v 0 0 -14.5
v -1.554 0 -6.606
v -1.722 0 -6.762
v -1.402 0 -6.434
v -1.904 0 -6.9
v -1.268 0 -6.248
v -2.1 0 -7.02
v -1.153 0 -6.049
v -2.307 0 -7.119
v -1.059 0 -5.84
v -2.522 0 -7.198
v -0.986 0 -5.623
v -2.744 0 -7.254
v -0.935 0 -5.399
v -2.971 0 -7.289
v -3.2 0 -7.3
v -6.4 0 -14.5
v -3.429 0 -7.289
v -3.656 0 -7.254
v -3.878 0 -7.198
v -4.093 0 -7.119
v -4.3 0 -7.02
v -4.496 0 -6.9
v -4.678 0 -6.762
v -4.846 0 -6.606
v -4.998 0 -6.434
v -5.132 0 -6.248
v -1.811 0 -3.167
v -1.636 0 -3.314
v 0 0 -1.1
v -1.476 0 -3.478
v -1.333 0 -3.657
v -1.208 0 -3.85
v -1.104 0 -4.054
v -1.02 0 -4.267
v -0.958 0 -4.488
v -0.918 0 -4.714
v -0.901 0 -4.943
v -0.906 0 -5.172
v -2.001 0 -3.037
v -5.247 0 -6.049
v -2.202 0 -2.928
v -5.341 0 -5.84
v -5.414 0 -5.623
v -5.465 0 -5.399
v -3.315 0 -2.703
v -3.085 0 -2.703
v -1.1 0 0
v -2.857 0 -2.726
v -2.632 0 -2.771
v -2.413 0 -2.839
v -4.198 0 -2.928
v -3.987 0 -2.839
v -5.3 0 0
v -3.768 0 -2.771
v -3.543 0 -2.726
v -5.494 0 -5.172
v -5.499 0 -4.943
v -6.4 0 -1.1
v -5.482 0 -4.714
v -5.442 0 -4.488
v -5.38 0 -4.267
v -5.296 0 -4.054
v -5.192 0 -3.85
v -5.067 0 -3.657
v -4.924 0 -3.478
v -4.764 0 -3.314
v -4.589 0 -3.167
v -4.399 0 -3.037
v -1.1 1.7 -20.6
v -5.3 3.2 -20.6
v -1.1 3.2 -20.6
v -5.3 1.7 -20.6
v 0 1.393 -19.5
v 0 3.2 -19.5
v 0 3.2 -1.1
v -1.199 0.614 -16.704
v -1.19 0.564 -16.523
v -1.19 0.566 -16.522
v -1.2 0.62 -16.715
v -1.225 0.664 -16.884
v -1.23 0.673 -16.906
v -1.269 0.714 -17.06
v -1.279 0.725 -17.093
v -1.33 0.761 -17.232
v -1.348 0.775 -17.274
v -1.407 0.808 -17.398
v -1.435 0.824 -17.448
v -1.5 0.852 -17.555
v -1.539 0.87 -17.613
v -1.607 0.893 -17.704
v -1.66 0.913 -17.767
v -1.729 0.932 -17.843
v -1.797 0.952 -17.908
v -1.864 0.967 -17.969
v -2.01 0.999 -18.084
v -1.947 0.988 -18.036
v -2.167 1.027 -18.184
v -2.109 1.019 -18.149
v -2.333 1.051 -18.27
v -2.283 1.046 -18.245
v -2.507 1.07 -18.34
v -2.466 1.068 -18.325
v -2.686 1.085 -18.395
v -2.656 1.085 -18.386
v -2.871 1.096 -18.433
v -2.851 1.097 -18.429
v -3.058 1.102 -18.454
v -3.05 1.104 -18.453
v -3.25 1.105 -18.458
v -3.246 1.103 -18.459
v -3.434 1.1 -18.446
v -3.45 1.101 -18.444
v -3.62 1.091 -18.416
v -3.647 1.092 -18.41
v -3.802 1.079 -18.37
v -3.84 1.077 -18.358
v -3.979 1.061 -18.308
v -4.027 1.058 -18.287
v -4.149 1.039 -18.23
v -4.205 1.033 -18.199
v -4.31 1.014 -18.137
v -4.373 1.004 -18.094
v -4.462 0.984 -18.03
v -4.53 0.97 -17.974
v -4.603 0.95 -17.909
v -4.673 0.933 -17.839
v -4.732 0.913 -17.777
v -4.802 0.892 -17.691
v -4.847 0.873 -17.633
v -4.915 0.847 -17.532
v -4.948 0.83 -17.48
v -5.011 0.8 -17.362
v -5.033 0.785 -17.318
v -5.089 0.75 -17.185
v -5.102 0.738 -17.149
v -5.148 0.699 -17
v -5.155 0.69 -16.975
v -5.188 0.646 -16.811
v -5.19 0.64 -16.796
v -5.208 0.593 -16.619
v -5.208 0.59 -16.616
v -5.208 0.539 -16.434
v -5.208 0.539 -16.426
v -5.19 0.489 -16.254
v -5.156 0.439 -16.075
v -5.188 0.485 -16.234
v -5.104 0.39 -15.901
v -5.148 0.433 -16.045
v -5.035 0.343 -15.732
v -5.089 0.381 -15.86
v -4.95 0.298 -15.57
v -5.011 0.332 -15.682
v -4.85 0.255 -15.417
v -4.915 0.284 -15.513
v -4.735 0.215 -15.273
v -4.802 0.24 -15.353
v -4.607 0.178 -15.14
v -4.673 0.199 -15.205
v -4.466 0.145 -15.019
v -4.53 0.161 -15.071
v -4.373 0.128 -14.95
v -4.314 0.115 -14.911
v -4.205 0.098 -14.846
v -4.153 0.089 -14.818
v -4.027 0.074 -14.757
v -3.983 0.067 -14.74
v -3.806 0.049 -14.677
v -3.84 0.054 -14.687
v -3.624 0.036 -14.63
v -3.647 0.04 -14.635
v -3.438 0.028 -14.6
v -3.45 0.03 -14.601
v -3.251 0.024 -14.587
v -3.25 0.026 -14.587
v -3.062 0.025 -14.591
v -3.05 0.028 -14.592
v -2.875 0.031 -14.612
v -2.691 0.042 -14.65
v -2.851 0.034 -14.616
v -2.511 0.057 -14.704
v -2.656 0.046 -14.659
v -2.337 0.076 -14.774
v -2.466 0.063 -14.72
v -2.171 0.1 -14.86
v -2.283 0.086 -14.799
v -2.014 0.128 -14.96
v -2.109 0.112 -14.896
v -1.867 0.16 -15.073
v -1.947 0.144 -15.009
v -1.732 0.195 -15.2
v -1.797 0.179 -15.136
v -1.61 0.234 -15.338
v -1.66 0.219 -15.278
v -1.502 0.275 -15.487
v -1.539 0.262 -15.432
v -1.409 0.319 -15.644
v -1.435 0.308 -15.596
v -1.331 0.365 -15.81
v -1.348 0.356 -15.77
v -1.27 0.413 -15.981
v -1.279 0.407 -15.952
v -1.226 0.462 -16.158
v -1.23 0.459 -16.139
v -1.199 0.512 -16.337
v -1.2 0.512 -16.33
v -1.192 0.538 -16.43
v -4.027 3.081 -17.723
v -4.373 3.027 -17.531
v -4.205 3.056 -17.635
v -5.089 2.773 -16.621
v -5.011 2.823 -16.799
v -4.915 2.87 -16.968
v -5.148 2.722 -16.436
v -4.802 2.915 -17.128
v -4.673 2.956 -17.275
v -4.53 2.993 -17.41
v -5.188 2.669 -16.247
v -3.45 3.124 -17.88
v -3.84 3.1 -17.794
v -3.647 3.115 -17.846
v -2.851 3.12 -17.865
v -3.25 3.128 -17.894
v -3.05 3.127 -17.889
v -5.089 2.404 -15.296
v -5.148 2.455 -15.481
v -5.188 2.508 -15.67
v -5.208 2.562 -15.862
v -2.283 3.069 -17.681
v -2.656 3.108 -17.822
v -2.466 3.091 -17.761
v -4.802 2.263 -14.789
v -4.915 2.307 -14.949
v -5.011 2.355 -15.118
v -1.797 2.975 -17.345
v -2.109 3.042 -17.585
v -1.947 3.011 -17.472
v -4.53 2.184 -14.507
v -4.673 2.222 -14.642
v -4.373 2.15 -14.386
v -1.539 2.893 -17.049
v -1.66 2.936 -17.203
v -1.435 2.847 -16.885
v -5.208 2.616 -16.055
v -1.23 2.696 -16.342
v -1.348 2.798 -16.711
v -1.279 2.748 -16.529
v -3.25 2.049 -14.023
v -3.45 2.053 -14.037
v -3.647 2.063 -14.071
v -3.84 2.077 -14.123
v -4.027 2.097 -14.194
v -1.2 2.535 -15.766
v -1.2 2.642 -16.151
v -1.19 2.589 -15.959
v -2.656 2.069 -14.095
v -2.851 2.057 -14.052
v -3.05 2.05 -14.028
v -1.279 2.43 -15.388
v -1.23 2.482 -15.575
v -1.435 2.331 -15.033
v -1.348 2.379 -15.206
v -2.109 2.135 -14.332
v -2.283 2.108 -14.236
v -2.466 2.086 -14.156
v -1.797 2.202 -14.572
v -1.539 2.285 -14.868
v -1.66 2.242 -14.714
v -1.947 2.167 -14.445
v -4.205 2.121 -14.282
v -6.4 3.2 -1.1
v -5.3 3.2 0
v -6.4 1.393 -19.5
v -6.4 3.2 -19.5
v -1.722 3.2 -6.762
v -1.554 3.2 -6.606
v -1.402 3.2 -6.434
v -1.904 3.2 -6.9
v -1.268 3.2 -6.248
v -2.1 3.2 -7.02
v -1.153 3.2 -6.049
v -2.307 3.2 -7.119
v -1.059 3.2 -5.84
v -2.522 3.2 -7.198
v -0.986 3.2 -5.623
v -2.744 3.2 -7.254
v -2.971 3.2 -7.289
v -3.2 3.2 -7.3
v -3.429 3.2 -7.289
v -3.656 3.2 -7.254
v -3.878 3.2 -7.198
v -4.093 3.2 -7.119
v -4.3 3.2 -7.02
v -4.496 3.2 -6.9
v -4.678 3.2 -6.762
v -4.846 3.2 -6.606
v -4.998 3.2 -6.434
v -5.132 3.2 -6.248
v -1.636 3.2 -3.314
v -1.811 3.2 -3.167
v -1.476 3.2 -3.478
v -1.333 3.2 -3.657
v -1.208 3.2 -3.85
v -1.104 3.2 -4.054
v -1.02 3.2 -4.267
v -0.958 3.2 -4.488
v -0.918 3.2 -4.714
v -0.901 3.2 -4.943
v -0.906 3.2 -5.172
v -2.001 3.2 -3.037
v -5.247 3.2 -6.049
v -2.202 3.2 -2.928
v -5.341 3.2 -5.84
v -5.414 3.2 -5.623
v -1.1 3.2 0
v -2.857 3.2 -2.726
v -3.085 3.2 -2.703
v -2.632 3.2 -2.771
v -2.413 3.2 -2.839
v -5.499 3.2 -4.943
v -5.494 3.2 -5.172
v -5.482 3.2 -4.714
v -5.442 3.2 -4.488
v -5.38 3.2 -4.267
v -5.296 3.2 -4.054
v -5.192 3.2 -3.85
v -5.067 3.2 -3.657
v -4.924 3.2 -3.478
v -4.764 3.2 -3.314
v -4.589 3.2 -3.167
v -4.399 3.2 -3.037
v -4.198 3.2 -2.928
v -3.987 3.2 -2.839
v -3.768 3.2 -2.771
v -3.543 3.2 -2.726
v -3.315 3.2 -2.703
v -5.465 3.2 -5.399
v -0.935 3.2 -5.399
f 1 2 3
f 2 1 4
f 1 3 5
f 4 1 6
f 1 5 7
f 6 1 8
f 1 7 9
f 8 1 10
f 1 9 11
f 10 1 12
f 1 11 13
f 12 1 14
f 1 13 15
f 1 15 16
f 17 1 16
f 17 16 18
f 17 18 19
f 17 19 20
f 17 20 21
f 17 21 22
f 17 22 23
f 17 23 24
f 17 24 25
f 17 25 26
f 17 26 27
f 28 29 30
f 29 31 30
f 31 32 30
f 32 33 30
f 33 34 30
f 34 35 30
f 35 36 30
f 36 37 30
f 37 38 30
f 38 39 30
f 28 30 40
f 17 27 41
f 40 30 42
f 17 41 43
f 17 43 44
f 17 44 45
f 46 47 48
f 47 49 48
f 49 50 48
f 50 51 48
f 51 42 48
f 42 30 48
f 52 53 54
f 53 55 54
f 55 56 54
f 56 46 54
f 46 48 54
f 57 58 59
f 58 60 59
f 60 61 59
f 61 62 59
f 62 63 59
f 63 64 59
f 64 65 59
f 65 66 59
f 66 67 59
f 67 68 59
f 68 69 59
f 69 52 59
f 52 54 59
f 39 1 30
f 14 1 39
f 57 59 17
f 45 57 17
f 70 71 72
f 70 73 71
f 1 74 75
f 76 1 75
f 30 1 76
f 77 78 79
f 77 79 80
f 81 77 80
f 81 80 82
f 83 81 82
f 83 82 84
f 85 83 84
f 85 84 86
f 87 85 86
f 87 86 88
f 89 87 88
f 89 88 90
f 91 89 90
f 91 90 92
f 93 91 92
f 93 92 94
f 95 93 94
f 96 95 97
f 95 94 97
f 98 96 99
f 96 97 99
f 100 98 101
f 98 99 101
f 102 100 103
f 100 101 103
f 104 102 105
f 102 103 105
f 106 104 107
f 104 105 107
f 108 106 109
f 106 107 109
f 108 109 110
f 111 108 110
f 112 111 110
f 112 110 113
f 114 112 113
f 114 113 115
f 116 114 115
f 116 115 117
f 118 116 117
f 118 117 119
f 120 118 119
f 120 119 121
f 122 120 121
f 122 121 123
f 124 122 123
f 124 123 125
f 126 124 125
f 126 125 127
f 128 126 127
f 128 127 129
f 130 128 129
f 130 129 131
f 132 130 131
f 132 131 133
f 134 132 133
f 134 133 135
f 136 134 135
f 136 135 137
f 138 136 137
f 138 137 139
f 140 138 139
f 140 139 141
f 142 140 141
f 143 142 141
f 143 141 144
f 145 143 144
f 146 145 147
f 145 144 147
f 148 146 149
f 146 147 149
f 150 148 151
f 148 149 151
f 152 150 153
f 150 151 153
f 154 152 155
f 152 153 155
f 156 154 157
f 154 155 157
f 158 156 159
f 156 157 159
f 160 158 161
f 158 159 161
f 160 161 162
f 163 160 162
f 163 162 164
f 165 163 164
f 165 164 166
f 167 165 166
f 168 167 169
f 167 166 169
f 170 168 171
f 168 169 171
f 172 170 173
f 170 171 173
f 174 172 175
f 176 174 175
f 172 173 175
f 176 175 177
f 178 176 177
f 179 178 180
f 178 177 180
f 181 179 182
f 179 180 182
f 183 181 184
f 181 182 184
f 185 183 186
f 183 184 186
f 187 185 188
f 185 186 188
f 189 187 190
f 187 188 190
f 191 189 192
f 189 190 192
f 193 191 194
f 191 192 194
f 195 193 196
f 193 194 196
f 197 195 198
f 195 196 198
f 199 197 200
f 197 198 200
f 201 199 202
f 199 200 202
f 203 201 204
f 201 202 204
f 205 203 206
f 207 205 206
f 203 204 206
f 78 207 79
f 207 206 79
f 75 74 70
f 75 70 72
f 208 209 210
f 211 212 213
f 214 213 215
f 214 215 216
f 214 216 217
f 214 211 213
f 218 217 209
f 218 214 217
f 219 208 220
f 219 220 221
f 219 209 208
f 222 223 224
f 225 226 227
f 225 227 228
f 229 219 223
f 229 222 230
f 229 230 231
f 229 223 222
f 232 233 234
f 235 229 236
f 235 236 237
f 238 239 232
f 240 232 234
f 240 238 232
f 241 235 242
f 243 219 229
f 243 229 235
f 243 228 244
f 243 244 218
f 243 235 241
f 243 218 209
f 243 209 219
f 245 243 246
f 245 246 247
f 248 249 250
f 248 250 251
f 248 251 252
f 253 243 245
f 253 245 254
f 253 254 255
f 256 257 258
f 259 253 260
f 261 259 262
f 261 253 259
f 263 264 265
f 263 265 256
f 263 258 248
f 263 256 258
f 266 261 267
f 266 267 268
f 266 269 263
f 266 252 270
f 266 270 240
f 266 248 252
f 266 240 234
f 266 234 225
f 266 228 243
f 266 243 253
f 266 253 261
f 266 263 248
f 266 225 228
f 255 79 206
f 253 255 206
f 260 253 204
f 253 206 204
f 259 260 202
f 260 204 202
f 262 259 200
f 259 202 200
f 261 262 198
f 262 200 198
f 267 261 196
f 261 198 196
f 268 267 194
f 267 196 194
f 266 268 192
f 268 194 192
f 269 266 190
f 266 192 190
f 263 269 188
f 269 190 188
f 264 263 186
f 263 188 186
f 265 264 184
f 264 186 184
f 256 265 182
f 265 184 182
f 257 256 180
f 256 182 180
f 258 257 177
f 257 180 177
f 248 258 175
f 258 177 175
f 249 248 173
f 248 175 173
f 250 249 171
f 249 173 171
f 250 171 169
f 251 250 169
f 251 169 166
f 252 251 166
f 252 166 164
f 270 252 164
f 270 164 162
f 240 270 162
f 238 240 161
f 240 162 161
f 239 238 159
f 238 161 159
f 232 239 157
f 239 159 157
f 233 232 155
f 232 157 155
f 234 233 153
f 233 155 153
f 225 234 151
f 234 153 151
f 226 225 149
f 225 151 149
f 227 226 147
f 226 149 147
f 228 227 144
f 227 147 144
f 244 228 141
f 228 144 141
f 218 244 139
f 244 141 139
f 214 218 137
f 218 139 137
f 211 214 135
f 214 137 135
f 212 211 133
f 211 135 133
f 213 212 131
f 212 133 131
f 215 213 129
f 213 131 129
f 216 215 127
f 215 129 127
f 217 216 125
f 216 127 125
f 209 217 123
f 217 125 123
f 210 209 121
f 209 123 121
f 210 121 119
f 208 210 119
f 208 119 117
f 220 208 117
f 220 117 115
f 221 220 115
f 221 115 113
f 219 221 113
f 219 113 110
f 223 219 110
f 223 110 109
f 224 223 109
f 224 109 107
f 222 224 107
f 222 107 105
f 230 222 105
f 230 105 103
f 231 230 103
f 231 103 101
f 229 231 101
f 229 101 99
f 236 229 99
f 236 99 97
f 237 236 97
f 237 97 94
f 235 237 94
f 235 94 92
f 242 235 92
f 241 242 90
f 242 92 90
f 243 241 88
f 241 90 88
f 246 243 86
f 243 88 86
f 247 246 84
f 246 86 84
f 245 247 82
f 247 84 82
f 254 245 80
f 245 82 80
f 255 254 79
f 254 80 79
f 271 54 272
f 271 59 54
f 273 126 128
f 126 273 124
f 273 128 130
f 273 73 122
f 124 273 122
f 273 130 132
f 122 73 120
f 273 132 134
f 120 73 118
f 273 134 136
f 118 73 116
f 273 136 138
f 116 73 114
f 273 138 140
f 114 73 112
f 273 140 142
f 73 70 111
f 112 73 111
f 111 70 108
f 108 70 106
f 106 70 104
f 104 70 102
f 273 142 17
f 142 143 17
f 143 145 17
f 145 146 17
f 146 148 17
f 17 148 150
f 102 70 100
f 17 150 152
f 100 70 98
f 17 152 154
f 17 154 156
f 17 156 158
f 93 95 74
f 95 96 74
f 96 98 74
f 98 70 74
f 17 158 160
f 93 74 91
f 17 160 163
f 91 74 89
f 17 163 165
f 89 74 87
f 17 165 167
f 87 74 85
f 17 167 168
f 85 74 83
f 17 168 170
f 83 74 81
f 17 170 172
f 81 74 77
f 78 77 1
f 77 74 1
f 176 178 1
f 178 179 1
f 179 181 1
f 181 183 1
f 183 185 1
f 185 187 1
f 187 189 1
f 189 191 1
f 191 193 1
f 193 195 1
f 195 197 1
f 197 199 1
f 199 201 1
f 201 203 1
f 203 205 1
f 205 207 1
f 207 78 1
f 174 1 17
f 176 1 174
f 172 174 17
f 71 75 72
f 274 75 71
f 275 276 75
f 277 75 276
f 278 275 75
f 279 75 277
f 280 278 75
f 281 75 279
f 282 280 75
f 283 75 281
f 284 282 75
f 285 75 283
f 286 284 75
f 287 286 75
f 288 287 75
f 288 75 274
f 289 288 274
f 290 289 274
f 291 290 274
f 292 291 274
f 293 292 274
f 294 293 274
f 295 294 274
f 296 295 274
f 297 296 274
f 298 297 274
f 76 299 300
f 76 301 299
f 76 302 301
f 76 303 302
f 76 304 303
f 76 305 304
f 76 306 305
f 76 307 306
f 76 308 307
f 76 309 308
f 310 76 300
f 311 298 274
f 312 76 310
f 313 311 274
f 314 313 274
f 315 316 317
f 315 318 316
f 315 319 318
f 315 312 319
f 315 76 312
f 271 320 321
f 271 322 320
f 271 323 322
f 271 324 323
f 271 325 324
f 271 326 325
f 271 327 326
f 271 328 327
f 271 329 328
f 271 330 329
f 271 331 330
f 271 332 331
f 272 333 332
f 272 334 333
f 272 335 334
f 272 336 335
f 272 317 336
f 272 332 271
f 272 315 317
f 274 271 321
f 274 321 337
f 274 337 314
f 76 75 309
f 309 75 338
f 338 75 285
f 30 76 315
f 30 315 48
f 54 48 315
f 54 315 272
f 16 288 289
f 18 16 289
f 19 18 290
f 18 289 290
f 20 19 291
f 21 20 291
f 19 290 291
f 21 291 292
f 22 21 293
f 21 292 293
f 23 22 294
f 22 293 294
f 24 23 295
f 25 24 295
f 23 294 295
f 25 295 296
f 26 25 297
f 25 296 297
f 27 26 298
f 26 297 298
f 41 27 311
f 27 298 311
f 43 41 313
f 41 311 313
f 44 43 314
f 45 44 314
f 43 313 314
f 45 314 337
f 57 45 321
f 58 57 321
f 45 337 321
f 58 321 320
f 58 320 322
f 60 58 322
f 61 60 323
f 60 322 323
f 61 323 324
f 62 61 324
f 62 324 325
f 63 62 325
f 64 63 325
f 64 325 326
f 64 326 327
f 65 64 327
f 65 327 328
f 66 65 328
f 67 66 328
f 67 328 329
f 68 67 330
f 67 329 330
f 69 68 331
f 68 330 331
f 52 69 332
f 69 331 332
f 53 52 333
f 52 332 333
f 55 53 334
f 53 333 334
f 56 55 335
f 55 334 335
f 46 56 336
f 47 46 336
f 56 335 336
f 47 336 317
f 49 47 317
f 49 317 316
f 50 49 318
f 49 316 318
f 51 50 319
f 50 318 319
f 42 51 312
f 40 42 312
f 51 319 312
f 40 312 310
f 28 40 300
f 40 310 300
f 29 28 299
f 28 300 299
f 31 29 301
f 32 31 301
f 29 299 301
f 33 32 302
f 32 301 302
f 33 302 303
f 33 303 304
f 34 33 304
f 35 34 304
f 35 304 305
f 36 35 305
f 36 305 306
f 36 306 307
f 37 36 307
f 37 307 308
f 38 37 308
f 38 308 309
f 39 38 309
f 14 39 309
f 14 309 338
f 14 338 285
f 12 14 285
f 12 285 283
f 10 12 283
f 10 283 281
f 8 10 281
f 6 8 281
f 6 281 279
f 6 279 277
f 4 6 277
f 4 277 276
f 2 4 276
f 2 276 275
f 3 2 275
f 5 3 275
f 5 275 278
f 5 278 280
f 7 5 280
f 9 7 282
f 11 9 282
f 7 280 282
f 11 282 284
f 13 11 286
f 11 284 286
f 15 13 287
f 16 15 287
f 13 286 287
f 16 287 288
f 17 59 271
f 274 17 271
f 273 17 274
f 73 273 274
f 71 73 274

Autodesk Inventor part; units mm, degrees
ref_plane "YZ Plane" through (0, 0, 0) normal (1, 0, 0) x (0, 1, 0)
ref_plane "XZ Plane" through (0, 0, 0) normal (0, 1, 0) x (-1, 0, 0)
sketch "Sketch1" plane through (0, 0, 0) normal (0, 1, 0) x (-1, 0, 0)
  line L0 (0, 0) -> (6.4, 0)
  line L1 (6.4, 0) -> (6.4, -20.6)
  line L2 (6.4, -20.6) -> (0, -20.6)
  line L3 (0, -20.6) -> (0, 0)
  point P0 (3.2, -7.9)
  dimension "d0" = 6.4
  dimension "d1" = 20.6
extrude "Extrusion1" add sketch "Sketch1" along normal blind 3.2
sketch "Sketch3" plane through (0, 0, 0) normal (0, -1, 0) x (1, 0, 0)
  point P0 (0, 0)
  point P1 (-3.2, -5)
hole "Hole1" at (-3.2, 0, -5) direction (0, 1, 0) diameter 4.6 end through all
chamfer "Chamfer1" distance 1.1 angle 45 1 edges at (0, 1.6, 0)
chamfer "Chamfer2" distance 1.1 angle 45 1 edges at (-6.4, 1.6, 0)
chamfer "Chamfer3" distance 1.1 angle 45 1 edges at (-6.4, 1.6, -20.6)
chamfer "Chamfer4" distance 1.1 angle 45 1 edges at (0, 1.6, -20.6)
sketch "Sketch5" plane through (0, 0, 0) normal (1, 0, 0) x (0, 1, 0)
  line L0 (3.2, -20.6) -> (0, -20.6) projected
  line L1 (0, -20.6) -> (0, -14.5)
  line L2 (0, -1.1) -> (0, -19.5) projected
  line L3 (0, -20.6) -> (1.7, -20.6)
  line L4 (1.7, -20.6) -> (0, -14.5)
  point P0 (0, 0)
  dimension "d26" = 6.1
  dimension "d27" = 1.7
extrude "Extrusion3" cut sketch "Sketch5" against normal through all
ref_plane "Work Plane1" through (-6.4, 0, -14.5) normal (0, -0.9633, -0.2685) x (1, 0, 0)
sketch "Sketch11" plane through (-6.4, 0, -14.5) normal (0, -0.9633, -0.2685) x (1, 0, 0)
  circle A0 centre (3.2, -2.1) radius 2.01
  line L0 (0, 0) -> (6.4, 0) projected
  point P0 (6.4, 13.9677)
  dimension "d31" = 4.02
  dimension "d34" = 2.1
extrude "Extrusion4" cut sketch "Sketch11" along normal mid plane 4.2
properties part number "HeadbarClamp"
